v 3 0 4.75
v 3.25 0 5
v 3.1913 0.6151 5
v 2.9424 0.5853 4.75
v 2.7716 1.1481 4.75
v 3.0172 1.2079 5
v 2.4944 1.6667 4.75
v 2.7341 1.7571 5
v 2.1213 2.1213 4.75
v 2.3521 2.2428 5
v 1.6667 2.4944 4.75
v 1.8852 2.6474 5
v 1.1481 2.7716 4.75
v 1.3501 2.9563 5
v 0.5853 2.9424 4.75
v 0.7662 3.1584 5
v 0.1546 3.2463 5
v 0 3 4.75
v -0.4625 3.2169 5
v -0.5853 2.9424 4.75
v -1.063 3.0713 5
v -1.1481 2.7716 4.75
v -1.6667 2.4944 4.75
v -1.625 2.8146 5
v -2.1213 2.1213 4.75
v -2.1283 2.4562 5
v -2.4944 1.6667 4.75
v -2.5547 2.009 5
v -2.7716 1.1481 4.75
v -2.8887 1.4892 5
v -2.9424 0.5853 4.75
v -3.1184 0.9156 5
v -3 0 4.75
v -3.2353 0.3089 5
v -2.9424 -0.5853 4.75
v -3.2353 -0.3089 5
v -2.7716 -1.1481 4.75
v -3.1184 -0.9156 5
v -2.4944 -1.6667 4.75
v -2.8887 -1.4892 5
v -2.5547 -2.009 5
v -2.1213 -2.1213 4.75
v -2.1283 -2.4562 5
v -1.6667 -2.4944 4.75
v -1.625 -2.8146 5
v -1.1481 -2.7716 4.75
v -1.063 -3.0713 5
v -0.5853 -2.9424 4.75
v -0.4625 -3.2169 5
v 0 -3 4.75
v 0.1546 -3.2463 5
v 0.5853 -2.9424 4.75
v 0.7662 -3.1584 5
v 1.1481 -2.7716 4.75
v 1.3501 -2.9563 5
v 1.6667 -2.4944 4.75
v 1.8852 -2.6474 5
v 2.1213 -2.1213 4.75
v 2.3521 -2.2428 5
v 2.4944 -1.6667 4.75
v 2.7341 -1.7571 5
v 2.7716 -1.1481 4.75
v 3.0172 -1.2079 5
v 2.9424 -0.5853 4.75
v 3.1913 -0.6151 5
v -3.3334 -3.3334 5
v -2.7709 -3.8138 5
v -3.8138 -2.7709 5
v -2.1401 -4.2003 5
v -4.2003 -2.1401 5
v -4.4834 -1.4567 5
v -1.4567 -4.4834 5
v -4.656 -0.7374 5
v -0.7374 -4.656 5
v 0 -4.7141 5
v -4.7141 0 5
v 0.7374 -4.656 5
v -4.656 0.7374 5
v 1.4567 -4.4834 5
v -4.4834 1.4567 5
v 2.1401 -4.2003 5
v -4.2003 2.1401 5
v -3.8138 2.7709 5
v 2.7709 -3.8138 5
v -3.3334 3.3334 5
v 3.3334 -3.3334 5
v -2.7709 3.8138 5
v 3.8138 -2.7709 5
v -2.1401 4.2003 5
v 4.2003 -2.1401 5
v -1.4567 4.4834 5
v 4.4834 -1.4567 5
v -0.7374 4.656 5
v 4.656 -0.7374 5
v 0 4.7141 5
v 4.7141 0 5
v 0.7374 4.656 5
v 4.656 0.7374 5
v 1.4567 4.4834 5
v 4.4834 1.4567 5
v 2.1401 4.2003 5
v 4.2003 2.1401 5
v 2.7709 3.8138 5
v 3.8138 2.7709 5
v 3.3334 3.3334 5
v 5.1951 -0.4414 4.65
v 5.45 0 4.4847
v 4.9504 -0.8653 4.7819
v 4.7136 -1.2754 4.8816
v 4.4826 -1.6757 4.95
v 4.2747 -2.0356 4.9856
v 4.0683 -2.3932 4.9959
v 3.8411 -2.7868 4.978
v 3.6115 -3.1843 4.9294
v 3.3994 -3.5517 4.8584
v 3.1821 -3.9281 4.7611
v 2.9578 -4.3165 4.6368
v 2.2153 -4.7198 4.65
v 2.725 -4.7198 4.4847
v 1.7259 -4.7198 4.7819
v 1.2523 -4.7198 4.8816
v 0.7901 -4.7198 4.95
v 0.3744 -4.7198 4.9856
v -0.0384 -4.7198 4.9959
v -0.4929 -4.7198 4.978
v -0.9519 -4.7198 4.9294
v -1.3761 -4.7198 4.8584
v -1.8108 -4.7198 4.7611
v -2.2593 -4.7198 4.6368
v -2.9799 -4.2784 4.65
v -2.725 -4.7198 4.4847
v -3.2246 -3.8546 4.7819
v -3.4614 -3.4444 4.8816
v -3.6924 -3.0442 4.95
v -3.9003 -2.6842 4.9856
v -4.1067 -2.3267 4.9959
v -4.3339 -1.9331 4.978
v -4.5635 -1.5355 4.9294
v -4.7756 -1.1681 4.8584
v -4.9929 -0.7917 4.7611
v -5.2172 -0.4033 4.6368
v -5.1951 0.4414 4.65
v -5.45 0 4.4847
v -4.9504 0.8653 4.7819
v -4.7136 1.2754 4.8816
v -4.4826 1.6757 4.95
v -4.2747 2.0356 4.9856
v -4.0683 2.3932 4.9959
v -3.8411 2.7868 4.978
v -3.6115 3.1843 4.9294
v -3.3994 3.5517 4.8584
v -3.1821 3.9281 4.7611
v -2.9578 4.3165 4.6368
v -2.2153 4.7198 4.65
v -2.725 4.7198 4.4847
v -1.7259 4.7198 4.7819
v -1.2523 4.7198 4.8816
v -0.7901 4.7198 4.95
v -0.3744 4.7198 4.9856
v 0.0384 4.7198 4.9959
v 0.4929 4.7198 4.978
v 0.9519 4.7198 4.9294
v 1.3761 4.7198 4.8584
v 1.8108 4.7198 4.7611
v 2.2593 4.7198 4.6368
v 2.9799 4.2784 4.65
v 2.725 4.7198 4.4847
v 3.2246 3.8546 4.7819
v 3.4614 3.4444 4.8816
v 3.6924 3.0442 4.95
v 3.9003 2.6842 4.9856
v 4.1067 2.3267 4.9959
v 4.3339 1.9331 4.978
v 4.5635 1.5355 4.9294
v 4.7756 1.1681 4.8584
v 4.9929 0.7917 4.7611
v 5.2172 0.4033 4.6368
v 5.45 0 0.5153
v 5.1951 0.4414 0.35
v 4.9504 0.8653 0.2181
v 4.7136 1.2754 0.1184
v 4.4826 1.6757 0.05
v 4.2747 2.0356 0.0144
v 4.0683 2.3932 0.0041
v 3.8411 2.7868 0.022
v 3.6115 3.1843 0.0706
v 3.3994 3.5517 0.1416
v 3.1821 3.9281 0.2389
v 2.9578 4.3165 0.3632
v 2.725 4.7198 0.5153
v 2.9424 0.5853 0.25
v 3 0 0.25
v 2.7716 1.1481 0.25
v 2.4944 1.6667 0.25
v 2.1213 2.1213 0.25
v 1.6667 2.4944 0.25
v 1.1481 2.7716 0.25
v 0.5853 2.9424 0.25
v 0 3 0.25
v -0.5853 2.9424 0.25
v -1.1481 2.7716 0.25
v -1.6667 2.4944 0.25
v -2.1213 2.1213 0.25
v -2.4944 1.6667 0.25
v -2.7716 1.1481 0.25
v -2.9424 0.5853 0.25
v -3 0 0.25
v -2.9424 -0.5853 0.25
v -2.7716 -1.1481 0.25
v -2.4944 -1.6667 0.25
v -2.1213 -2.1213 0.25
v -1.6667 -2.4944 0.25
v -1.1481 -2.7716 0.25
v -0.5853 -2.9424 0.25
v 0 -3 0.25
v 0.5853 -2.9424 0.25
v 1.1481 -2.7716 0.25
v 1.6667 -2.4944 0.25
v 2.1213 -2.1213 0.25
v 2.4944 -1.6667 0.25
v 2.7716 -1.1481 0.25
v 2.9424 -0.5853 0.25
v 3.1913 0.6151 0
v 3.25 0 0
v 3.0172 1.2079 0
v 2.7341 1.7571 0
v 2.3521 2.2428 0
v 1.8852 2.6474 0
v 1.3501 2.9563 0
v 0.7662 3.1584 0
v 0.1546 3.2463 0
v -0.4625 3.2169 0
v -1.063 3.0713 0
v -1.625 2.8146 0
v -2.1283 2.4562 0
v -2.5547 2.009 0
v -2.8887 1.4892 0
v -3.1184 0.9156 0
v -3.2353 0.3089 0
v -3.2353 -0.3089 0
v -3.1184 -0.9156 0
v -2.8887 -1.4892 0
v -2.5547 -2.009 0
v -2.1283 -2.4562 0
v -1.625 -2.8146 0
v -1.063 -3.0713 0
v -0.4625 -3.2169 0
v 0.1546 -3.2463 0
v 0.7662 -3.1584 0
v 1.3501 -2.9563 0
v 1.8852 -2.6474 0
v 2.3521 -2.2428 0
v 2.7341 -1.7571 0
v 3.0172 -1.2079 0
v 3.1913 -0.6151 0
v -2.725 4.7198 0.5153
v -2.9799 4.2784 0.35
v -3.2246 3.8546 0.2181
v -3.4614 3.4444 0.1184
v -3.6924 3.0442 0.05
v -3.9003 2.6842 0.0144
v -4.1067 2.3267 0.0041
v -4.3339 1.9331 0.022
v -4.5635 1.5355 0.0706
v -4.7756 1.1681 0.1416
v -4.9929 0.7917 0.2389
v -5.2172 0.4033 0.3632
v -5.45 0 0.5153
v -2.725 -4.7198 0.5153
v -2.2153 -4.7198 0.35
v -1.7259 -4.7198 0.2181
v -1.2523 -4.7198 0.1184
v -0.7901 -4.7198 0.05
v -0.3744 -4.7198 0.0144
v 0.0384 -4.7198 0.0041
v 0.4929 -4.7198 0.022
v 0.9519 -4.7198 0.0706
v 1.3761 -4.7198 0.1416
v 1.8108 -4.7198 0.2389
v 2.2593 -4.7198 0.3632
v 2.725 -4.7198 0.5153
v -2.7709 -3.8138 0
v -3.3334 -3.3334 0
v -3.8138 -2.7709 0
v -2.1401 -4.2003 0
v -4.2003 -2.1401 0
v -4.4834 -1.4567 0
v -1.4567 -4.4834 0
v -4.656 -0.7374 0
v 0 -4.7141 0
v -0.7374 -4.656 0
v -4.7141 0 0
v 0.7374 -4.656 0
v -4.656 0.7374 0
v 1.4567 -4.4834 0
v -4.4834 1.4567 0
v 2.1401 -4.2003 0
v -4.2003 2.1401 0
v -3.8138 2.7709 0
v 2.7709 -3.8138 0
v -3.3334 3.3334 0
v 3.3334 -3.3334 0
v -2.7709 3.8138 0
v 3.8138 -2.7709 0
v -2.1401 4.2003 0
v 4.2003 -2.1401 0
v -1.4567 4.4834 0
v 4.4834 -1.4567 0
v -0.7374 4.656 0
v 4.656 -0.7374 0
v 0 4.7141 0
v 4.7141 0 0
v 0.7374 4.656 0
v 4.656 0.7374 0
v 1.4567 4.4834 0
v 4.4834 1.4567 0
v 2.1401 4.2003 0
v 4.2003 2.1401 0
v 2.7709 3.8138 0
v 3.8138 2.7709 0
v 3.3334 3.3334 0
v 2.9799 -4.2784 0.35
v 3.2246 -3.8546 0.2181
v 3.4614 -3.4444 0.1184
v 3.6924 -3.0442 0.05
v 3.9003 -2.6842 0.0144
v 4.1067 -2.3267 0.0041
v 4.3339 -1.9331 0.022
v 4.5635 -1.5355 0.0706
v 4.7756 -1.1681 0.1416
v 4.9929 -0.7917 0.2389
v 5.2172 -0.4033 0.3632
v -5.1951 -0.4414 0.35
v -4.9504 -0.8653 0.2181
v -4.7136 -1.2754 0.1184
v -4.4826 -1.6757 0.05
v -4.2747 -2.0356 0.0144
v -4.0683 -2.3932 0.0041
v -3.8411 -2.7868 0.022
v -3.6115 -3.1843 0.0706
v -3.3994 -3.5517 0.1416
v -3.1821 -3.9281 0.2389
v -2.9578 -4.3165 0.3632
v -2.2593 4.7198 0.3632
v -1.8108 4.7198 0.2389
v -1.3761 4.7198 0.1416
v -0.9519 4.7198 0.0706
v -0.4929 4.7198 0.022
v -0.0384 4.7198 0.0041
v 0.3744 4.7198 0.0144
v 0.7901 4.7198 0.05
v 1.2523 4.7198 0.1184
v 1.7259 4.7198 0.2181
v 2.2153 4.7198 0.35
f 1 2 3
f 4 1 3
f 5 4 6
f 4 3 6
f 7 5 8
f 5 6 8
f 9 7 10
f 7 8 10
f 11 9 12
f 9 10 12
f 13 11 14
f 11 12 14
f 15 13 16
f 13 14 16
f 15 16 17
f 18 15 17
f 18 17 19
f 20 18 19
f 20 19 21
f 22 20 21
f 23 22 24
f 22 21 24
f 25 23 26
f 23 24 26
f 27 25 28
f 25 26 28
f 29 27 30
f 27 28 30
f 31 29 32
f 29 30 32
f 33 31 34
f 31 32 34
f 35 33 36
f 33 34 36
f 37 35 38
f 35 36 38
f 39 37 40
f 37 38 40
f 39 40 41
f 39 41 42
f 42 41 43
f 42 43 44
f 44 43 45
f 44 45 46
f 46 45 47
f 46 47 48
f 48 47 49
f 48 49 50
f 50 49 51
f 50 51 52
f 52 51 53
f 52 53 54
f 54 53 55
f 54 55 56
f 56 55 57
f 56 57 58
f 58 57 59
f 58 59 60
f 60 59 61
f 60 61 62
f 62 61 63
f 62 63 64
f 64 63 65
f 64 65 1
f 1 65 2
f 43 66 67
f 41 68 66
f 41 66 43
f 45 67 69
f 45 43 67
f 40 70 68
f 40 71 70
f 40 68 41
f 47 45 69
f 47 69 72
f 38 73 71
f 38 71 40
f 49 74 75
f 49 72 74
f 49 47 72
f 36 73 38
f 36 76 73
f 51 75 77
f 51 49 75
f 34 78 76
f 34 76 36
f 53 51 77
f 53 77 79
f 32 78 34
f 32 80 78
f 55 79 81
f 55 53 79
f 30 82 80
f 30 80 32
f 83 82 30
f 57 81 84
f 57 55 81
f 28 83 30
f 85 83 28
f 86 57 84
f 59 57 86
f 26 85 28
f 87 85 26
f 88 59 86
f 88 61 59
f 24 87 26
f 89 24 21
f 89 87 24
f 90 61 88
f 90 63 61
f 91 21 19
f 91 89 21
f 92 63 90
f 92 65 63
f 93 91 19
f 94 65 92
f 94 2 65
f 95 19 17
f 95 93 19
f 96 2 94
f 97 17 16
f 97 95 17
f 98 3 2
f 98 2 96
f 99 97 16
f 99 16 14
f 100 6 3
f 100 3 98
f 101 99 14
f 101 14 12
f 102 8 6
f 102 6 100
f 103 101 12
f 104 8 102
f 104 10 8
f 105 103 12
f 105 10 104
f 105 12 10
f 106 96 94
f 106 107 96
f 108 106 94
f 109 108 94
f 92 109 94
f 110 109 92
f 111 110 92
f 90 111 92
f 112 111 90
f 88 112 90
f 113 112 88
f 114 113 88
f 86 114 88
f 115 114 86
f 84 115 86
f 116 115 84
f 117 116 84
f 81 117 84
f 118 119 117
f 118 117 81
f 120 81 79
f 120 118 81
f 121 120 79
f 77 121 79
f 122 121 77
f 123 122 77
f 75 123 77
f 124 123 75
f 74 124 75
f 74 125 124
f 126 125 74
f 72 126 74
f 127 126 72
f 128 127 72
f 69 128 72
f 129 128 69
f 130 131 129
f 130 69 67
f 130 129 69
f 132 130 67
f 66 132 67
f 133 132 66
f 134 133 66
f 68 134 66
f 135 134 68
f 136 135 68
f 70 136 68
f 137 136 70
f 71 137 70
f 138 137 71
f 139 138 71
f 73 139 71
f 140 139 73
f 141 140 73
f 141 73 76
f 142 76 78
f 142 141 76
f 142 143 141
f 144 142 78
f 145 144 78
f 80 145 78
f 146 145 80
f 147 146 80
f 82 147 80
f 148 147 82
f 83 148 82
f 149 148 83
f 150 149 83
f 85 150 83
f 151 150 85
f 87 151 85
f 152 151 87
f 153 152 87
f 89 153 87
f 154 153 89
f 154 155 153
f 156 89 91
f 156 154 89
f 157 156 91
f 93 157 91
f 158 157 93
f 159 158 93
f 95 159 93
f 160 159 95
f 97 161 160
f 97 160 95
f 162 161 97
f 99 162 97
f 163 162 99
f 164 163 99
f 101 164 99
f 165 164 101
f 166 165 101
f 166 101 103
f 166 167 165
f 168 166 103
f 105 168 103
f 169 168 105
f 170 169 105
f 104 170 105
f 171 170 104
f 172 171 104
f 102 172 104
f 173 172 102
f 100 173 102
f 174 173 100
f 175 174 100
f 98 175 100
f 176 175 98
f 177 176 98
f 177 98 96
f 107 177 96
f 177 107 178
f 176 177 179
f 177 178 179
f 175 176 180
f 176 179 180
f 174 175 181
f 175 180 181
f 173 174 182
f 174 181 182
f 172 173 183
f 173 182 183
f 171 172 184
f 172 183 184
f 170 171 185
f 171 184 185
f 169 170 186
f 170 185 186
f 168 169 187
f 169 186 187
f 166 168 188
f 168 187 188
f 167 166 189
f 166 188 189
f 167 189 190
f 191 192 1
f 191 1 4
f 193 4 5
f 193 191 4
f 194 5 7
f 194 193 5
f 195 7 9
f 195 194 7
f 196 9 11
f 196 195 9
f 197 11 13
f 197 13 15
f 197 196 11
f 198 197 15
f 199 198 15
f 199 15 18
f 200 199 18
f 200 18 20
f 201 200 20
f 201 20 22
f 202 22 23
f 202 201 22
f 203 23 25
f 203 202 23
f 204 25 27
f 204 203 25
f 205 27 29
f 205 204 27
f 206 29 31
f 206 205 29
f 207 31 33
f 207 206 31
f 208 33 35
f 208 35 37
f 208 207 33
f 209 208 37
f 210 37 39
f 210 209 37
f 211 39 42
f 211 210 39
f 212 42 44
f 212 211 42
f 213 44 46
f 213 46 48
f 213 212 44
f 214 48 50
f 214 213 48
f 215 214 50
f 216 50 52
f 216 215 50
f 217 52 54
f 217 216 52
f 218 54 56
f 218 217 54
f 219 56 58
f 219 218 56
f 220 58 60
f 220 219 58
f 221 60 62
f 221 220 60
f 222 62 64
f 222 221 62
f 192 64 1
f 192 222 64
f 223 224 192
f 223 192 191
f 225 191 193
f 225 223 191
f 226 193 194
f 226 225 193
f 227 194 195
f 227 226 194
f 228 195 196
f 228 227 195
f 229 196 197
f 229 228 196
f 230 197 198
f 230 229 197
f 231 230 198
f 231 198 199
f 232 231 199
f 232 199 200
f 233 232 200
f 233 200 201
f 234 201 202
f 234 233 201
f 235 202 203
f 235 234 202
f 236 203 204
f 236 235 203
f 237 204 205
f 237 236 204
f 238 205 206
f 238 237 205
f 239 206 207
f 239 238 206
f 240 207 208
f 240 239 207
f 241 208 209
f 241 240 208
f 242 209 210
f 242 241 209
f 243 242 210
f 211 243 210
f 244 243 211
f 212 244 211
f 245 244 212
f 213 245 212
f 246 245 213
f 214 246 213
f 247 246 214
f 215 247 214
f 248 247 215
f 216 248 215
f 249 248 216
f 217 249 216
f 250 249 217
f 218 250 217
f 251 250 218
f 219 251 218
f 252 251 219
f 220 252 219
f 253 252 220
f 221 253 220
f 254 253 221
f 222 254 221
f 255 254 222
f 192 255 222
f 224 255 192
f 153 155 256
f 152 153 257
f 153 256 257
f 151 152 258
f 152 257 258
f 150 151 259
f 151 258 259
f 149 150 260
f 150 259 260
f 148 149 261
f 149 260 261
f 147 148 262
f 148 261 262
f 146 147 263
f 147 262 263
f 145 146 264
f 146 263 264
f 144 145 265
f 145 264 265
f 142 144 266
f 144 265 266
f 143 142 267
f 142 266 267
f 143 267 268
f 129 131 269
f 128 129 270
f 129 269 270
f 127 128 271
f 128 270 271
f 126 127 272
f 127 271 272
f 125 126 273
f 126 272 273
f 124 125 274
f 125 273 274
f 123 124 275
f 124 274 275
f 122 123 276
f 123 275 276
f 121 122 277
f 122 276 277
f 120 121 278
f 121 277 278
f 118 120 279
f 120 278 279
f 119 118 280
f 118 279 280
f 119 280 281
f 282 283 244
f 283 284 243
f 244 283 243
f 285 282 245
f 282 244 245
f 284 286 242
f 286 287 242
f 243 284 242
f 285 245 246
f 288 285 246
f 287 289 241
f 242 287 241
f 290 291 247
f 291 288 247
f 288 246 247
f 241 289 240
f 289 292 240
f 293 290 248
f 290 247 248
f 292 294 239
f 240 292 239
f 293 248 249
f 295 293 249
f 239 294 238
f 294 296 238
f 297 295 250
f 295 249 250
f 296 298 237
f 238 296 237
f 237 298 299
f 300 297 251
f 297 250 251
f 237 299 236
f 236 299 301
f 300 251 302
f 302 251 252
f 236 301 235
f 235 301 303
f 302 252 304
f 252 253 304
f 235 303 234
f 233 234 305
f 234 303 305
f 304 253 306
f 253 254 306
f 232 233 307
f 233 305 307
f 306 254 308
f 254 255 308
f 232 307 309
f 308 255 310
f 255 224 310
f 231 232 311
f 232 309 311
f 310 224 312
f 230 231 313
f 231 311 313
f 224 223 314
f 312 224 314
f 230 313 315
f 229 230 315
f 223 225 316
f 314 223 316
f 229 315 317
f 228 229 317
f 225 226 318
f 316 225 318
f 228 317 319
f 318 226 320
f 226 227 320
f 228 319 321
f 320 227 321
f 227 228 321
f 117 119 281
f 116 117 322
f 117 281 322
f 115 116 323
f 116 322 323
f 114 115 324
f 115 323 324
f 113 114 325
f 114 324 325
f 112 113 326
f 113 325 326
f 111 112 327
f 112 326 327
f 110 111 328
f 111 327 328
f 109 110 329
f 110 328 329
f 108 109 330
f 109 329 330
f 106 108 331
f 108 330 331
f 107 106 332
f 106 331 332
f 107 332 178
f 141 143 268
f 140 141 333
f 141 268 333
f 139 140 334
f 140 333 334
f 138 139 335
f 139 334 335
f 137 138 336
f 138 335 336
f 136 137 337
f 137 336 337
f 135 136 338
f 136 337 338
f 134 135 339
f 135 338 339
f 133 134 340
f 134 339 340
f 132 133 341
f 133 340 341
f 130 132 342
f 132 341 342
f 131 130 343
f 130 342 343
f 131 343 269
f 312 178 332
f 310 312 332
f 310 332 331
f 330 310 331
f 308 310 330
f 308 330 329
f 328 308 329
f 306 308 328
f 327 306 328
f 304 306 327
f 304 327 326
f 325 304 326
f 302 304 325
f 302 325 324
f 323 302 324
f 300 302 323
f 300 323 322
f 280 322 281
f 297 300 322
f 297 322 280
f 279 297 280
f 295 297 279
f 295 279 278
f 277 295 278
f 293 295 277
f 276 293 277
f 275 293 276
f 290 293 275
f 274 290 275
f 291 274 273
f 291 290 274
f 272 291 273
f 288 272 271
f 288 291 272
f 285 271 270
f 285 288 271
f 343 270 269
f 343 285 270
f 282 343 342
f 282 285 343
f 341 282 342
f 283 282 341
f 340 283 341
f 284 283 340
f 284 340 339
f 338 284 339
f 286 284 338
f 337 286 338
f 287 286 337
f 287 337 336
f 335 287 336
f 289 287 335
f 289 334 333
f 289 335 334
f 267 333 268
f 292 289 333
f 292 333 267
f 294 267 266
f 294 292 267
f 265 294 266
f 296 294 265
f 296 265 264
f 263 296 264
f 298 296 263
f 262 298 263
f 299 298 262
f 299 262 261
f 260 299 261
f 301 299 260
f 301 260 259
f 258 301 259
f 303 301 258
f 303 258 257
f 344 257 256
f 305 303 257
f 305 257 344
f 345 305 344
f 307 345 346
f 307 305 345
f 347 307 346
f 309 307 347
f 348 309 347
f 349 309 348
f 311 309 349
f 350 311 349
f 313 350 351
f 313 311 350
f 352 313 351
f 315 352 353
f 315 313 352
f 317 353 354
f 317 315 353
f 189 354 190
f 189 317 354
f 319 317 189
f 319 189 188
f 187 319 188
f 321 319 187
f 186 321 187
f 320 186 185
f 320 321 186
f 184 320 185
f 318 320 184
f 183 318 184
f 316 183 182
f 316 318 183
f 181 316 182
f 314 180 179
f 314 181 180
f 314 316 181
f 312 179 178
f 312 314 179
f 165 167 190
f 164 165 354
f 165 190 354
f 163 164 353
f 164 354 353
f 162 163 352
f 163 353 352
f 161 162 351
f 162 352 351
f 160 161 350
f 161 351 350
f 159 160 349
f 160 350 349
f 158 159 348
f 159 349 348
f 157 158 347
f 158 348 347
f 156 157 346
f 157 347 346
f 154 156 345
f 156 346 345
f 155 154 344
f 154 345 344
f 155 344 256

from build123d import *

# Parameters (mm, degrees)
SKETCH1_R           = 3
BOSS_EXTRUDE1_DEPTH = 5
CHAMFER1_SIZE       = 0.25


with BuildPart() as part:
    # Sketch1 → Boss-Extrude1 (new body)
    with BuildSketch(Plane.XY):
        Polygon((5.45, 0), (2.725, 4.719838451), (-2.725, 4.719838451), (-5.45, 0), (-2.725, -4.719838451), (2.725, -4.719838451), align=None)
        Circle(SKETCH1_R, mode=Mode.SUBTRACT)
    extrude(amount=BOSS_EXTRUDE1_DEPTH)

    # Chamfer1
    chamfer1_edges = [part.edges().sort_by_distance(p)[0] for p in [
        (-3, 0, 0),
        (-3, 0, 5),
    ]]
    chamfer(chamfer1_edges, length=CHAMFER1_SIZE)

    # Sketch2 → Cut-Revolve1 (revolve, cut)
    with BuildSketch(Plane(origin=(0, 0, 0), x_dir=(1, 0, 0), z_dir=(0, 1, 0)), mode=Mode.PRIVATE) as cut_revolve1_sk:
        Polygon((-1, -5.5), (-4, -5.5), (-6.14222201, -4), (-6.14222201, -1), (-4, 0.5), (-1, 0.5), (-1, 1.980198167), (-7.750900281, 1.980198167), (-7.750900281, -6.98400312), (-1, -6.98400312), align=None)
    revolve(cut_revolve1_sk.sketch.rotate(Axis((0, 0, 5.5), (0, 0, -1)), 180), axis=Axis((0, 0, 5.5), (0, 0, -1)), mode=Mode.SUBTRACT)


solid = part.part
